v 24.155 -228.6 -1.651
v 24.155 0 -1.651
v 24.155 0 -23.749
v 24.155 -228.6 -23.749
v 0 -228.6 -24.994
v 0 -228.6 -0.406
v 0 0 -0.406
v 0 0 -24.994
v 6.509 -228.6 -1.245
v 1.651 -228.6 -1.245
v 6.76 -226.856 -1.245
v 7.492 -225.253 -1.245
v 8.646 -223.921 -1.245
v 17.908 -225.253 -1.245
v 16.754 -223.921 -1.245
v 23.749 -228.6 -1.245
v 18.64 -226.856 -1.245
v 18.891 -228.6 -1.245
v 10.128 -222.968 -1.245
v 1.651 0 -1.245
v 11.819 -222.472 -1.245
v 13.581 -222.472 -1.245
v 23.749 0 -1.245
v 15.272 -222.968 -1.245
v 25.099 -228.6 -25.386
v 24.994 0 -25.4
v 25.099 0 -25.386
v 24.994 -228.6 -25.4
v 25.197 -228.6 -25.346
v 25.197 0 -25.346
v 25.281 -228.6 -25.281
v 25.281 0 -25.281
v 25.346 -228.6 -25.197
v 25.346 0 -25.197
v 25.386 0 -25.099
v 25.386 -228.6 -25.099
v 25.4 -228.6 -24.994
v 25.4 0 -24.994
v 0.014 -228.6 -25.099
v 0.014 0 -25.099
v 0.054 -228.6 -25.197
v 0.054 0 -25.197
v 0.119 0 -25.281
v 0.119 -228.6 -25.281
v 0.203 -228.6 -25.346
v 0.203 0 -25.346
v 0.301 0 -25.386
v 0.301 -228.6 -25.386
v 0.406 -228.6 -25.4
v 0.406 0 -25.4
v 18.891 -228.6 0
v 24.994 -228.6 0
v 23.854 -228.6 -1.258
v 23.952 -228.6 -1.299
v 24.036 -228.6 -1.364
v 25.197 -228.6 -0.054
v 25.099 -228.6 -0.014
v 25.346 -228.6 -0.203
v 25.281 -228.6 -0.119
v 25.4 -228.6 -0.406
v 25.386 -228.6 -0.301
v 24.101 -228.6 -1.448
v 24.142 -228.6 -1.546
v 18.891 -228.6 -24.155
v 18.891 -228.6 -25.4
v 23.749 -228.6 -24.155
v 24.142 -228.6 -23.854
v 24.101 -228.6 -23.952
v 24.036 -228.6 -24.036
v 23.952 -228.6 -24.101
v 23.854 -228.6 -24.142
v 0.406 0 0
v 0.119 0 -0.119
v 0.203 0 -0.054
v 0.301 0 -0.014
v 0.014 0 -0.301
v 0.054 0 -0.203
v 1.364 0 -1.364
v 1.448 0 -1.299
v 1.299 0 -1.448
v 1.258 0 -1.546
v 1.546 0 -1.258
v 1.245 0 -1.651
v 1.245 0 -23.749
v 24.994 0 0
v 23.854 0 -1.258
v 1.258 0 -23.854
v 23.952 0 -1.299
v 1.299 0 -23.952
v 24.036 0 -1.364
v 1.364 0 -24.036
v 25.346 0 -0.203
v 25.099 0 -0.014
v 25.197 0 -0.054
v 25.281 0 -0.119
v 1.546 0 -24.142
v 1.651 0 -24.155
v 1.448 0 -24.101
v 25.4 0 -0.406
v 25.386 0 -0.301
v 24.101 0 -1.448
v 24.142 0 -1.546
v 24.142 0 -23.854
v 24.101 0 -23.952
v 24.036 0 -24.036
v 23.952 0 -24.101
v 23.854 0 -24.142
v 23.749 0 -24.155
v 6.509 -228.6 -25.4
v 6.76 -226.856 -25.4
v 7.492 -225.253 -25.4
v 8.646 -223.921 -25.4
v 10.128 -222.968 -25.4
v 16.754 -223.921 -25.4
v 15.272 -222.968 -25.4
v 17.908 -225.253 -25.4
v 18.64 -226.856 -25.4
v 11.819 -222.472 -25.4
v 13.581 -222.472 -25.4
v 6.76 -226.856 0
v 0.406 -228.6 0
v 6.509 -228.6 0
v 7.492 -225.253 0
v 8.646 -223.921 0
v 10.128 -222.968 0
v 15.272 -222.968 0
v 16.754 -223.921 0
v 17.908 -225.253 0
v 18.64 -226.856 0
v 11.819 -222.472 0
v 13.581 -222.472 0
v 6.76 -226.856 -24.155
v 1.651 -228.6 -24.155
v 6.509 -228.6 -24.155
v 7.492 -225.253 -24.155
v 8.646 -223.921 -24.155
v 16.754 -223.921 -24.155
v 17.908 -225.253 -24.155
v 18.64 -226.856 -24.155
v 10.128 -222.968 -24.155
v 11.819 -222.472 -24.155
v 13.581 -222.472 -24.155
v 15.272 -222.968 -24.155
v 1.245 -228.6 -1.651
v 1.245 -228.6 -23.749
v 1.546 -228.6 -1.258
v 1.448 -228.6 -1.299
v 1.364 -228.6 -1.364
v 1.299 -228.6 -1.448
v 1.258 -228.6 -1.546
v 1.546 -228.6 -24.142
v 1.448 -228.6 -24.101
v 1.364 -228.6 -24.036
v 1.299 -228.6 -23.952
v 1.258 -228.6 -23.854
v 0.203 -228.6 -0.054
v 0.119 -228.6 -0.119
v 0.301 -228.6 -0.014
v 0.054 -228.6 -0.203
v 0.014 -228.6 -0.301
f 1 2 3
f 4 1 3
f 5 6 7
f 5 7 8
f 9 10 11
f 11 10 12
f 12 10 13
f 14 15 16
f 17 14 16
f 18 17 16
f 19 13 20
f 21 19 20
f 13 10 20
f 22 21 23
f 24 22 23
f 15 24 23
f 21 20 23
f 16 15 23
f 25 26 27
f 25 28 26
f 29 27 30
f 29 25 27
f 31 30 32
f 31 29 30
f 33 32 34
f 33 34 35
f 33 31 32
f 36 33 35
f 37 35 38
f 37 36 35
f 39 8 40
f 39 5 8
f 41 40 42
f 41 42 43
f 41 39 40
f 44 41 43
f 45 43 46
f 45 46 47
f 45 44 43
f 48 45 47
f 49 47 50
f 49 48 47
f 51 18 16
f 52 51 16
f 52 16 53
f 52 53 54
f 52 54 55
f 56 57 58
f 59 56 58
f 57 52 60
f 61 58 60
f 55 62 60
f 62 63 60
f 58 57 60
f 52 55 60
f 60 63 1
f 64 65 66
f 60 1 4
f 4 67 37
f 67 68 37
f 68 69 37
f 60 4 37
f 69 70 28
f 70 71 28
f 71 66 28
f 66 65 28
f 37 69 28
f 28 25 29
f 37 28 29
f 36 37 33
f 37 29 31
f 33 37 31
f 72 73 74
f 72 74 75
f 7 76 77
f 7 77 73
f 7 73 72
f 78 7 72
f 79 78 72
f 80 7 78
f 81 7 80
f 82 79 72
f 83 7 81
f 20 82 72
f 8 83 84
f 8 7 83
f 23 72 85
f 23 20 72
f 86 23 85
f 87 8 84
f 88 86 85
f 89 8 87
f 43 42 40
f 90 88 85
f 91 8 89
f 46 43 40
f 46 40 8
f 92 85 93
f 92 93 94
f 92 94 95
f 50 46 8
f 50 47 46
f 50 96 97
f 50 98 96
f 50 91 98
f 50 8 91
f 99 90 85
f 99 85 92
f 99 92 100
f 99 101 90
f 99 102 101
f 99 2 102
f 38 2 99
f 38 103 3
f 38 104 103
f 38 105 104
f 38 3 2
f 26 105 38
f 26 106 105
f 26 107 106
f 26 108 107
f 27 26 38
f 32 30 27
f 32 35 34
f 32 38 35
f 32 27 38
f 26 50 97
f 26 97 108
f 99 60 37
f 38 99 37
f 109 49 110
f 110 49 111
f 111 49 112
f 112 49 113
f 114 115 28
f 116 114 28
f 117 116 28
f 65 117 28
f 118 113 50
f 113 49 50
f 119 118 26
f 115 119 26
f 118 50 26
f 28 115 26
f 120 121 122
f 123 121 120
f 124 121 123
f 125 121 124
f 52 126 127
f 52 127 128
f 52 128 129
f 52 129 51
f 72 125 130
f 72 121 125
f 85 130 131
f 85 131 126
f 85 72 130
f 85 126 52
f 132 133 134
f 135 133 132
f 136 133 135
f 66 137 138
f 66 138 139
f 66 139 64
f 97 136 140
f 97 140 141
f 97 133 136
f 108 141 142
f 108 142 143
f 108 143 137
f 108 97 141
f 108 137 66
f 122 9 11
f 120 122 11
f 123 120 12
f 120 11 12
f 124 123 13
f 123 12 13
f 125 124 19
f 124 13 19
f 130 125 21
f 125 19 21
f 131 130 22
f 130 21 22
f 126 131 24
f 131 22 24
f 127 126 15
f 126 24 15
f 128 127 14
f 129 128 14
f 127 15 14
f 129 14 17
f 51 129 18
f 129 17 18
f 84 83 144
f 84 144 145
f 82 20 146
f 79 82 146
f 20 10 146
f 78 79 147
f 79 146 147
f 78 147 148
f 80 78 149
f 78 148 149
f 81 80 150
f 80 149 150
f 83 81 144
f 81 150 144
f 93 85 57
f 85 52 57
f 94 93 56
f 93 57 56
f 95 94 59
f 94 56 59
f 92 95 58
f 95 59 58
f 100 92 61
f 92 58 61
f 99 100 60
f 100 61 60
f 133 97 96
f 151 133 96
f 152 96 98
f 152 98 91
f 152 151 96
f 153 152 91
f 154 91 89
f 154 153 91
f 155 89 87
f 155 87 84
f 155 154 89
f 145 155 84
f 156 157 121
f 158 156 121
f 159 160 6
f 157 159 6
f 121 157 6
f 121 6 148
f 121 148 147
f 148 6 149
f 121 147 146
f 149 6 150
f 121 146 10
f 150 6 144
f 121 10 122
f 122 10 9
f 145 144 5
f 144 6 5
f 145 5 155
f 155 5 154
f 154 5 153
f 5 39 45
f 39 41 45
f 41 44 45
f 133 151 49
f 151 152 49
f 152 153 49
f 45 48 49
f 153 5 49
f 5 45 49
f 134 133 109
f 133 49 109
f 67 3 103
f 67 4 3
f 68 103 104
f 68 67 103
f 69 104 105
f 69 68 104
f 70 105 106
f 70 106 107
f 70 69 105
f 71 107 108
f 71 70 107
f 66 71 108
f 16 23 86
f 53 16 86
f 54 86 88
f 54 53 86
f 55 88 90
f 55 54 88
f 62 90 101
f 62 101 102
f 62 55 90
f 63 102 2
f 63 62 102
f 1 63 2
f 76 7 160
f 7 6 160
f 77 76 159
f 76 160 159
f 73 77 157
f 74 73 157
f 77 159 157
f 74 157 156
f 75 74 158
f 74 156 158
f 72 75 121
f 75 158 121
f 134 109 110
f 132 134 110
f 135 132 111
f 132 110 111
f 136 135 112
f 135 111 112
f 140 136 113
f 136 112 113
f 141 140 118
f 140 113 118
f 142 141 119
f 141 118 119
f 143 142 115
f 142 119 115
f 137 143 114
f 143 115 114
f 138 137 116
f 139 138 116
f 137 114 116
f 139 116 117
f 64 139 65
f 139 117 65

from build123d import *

# Parameters (mm, degrees)
SKETCH1_W           = 25.4
SKETCH1_H           = 25.4
SKETCH1_W_2         = 22.9108
SKETCH1_H_2         = 22.9108
BOSS_EXTRUDE1_DEPTH = 228.6
FILLET1_R           = 0.4064
SKETCH2_R           = 6.19125
CUT_EXTRUDE1_DEPTH  = 232.40501291


with BuildPart() as part:
    # Sketch1 → Boss-Extrude1 (new body)
    with BuildSketch(Plane(origin=(0, 0, 0), x_dir=(1, 0, 0), z_dir=(0, 1, 0))):
        with Locations((12.7, 12.7)):
            Rectangle(SKETCH1_W, SKETCH1_H)
        with Locations((12.7, 12.7)):
            Rectangle(SKETCH1_W_2, SKETCH1_H_2, mode=Mode.SUBTRACT)
    extrude(amount=-BOSS_EXTRUDE1_DEPTH)

    # Fillet1
    fillet1_edges = [part.edges().sort_by_distance(p)[0] for p in [
        (1.2446, -114.3, -1.2446),
        (1.2446, -114.3, -24.1554),
        (24.1554, -114.3, -24.1554),
        (24.1554, -114.3, -1.2446),
        (0, -114.3, -25.4),
        (25.4, -114.3, -25.4),
        (25.4, -114.3, 0),
        (0, -114.3, 0),
    ]]
    fillet(fillet1_edges, radius=FILLET1_R)

    # Sketch2 → Cut-Extrude1 (cut, through all)
    with BuildSketch(Plane(origin=(0, 0, -25.4), x_dir=(-1, 0, 0), z_dir=(0, 0, -1))):
        with Locations((-12.7, -228.6)):
            Circle(SKETCH2_R)
    extrude(amount=-CUT_EXTRUDE1_DEPTH, mode=Mode.SUBTRACT)


solid = part.part
